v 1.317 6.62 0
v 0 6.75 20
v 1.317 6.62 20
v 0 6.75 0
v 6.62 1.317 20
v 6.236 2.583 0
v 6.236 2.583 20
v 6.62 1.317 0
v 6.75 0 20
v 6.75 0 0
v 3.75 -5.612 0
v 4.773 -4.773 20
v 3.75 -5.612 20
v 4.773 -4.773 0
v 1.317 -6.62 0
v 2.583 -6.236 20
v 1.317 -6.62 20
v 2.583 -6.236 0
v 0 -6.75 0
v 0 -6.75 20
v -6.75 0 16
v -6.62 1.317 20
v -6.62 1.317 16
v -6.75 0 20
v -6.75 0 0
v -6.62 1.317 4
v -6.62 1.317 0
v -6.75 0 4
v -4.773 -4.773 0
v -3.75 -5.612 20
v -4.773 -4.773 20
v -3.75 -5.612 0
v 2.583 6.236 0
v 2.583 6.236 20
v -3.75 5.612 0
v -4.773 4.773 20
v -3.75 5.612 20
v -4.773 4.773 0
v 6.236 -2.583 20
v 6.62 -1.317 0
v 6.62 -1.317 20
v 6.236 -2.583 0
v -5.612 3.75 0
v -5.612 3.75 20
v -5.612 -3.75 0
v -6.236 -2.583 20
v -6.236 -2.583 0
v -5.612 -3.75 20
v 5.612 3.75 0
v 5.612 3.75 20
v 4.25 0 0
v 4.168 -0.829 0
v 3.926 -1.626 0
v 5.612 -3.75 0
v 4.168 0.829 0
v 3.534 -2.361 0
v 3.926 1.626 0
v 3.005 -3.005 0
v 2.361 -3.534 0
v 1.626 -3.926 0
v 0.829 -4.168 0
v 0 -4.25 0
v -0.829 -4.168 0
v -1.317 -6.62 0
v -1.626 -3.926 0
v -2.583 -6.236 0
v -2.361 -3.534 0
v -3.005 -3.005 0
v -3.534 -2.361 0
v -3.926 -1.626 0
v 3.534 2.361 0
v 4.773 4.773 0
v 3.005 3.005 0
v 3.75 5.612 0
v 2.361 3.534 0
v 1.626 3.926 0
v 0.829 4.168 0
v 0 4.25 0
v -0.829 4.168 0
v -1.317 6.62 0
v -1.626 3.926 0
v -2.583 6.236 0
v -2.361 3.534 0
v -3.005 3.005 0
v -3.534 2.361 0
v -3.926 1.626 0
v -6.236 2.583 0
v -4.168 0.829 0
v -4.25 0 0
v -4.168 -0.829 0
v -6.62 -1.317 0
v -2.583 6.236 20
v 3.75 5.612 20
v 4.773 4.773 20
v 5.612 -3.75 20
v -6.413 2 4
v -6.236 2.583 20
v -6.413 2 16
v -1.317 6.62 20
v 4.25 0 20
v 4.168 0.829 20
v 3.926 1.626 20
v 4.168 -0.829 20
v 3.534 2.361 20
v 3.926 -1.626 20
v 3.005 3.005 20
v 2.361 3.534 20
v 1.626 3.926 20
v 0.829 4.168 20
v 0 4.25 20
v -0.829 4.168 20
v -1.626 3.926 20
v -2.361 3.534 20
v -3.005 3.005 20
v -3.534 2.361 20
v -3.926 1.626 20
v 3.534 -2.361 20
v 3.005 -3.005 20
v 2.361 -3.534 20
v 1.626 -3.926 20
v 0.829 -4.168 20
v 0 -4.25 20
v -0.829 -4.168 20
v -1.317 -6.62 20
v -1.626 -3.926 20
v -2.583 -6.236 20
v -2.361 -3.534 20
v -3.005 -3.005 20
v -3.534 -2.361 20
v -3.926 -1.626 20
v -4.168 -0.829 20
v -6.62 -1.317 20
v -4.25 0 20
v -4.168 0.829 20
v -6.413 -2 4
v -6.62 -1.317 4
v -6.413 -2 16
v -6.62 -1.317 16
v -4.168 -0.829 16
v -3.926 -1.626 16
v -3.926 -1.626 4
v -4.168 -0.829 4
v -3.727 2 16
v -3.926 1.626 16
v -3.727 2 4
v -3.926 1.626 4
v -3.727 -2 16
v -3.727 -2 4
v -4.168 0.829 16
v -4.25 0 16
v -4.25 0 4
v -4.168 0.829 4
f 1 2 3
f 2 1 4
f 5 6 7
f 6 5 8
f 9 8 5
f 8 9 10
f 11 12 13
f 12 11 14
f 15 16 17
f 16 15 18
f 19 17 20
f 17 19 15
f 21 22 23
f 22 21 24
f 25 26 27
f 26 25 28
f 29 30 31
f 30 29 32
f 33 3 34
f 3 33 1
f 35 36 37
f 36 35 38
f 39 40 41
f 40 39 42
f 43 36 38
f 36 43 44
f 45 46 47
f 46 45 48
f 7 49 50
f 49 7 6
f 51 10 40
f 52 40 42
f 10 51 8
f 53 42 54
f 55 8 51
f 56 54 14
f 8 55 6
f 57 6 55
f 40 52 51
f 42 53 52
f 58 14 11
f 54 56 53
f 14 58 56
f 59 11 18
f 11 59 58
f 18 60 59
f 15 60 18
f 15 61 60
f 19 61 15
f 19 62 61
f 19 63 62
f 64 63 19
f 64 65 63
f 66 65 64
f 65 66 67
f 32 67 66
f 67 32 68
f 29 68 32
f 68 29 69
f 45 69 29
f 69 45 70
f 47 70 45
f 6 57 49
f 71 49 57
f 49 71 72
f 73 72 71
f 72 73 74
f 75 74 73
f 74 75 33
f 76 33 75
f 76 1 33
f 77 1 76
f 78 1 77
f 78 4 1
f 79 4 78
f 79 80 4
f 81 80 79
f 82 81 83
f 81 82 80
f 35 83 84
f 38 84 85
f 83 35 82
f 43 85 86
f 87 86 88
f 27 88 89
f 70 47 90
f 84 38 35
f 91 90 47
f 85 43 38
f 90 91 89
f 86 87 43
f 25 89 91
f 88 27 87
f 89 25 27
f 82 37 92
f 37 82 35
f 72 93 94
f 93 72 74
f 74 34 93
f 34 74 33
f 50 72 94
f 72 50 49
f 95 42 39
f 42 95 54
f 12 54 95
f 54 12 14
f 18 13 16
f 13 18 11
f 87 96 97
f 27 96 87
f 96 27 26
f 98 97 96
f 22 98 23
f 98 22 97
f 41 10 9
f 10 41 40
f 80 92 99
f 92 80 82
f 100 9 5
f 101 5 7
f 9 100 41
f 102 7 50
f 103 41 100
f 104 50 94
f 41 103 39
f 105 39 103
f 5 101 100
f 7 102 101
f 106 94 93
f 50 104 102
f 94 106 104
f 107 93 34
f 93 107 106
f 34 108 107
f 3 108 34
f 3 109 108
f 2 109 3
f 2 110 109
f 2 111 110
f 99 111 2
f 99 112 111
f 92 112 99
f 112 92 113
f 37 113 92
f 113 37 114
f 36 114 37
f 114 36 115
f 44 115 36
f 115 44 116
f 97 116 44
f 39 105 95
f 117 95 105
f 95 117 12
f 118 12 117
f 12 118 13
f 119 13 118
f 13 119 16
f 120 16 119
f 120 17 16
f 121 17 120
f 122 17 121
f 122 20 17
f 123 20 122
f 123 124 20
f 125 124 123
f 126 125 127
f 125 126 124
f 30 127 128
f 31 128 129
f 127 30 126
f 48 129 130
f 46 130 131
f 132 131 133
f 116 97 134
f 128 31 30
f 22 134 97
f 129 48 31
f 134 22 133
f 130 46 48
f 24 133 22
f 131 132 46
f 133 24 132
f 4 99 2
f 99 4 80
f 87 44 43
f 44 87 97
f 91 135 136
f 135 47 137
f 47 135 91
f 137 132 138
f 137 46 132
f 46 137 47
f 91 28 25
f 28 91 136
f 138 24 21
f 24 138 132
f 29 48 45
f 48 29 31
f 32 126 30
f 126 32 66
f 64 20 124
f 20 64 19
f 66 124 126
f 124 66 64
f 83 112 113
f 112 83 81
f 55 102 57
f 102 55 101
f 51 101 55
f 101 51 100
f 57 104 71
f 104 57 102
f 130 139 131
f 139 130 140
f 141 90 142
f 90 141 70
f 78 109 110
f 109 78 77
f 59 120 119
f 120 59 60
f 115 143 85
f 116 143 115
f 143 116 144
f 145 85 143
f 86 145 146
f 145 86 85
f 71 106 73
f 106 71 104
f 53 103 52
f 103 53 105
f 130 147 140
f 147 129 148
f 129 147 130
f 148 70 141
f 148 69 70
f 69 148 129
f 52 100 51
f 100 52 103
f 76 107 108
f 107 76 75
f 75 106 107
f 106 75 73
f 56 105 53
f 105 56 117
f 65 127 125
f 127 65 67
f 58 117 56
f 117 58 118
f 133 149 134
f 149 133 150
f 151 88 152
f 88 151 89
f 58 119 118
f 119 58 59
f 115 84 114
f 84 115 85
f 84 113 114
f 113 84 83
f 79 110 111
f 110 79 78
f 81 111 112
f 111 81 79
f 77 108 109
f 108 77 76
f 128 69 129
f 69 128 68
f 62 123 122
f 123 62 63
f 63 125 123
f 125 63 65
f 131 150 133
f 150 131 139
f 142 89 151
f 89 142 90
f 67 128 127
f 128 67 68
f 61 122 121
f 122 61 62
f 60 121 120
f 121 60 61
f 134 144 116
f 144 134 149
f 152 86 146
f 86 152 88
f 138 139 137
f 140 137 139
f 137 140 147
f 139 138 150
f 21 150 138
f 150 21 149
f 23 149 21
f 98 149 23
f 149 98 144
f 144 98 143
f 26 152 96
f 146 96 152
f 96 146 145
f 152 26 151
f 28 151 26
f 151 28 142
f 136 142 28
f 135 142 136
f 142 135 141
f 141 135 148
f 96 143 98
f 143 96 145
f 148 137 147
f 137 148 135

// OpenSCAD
$fn = 32;

// ----------------------------------------------------------------------
// Spacer sleeve: 13.5 / 8.5 x 20 mm
// ----------------------------------------------------------------------

// --- parameters (mm) ---
tube_d = 13.5;            // outside diameter
bore_d = 8.5;             // shaft bore
tube_l = 20;              // sleeve length
slot_w = 4;               // clamp slot width
slot_len = 12;            // clamp slot length

module sleeve() {
  cylinder(h = tube_l, d = tube_d);
}

difference() {
  sleeve();
  translate([0, 0, -1]) cylinder(h = tube_l + 2, d = bore_d);
  translate([-tube_d / 2 - 1, -slot_w / 2, tube_l / 2 - slot_len / 2]) cube([tube_d / 2 + 1, slot_w, slot_len]);
}
